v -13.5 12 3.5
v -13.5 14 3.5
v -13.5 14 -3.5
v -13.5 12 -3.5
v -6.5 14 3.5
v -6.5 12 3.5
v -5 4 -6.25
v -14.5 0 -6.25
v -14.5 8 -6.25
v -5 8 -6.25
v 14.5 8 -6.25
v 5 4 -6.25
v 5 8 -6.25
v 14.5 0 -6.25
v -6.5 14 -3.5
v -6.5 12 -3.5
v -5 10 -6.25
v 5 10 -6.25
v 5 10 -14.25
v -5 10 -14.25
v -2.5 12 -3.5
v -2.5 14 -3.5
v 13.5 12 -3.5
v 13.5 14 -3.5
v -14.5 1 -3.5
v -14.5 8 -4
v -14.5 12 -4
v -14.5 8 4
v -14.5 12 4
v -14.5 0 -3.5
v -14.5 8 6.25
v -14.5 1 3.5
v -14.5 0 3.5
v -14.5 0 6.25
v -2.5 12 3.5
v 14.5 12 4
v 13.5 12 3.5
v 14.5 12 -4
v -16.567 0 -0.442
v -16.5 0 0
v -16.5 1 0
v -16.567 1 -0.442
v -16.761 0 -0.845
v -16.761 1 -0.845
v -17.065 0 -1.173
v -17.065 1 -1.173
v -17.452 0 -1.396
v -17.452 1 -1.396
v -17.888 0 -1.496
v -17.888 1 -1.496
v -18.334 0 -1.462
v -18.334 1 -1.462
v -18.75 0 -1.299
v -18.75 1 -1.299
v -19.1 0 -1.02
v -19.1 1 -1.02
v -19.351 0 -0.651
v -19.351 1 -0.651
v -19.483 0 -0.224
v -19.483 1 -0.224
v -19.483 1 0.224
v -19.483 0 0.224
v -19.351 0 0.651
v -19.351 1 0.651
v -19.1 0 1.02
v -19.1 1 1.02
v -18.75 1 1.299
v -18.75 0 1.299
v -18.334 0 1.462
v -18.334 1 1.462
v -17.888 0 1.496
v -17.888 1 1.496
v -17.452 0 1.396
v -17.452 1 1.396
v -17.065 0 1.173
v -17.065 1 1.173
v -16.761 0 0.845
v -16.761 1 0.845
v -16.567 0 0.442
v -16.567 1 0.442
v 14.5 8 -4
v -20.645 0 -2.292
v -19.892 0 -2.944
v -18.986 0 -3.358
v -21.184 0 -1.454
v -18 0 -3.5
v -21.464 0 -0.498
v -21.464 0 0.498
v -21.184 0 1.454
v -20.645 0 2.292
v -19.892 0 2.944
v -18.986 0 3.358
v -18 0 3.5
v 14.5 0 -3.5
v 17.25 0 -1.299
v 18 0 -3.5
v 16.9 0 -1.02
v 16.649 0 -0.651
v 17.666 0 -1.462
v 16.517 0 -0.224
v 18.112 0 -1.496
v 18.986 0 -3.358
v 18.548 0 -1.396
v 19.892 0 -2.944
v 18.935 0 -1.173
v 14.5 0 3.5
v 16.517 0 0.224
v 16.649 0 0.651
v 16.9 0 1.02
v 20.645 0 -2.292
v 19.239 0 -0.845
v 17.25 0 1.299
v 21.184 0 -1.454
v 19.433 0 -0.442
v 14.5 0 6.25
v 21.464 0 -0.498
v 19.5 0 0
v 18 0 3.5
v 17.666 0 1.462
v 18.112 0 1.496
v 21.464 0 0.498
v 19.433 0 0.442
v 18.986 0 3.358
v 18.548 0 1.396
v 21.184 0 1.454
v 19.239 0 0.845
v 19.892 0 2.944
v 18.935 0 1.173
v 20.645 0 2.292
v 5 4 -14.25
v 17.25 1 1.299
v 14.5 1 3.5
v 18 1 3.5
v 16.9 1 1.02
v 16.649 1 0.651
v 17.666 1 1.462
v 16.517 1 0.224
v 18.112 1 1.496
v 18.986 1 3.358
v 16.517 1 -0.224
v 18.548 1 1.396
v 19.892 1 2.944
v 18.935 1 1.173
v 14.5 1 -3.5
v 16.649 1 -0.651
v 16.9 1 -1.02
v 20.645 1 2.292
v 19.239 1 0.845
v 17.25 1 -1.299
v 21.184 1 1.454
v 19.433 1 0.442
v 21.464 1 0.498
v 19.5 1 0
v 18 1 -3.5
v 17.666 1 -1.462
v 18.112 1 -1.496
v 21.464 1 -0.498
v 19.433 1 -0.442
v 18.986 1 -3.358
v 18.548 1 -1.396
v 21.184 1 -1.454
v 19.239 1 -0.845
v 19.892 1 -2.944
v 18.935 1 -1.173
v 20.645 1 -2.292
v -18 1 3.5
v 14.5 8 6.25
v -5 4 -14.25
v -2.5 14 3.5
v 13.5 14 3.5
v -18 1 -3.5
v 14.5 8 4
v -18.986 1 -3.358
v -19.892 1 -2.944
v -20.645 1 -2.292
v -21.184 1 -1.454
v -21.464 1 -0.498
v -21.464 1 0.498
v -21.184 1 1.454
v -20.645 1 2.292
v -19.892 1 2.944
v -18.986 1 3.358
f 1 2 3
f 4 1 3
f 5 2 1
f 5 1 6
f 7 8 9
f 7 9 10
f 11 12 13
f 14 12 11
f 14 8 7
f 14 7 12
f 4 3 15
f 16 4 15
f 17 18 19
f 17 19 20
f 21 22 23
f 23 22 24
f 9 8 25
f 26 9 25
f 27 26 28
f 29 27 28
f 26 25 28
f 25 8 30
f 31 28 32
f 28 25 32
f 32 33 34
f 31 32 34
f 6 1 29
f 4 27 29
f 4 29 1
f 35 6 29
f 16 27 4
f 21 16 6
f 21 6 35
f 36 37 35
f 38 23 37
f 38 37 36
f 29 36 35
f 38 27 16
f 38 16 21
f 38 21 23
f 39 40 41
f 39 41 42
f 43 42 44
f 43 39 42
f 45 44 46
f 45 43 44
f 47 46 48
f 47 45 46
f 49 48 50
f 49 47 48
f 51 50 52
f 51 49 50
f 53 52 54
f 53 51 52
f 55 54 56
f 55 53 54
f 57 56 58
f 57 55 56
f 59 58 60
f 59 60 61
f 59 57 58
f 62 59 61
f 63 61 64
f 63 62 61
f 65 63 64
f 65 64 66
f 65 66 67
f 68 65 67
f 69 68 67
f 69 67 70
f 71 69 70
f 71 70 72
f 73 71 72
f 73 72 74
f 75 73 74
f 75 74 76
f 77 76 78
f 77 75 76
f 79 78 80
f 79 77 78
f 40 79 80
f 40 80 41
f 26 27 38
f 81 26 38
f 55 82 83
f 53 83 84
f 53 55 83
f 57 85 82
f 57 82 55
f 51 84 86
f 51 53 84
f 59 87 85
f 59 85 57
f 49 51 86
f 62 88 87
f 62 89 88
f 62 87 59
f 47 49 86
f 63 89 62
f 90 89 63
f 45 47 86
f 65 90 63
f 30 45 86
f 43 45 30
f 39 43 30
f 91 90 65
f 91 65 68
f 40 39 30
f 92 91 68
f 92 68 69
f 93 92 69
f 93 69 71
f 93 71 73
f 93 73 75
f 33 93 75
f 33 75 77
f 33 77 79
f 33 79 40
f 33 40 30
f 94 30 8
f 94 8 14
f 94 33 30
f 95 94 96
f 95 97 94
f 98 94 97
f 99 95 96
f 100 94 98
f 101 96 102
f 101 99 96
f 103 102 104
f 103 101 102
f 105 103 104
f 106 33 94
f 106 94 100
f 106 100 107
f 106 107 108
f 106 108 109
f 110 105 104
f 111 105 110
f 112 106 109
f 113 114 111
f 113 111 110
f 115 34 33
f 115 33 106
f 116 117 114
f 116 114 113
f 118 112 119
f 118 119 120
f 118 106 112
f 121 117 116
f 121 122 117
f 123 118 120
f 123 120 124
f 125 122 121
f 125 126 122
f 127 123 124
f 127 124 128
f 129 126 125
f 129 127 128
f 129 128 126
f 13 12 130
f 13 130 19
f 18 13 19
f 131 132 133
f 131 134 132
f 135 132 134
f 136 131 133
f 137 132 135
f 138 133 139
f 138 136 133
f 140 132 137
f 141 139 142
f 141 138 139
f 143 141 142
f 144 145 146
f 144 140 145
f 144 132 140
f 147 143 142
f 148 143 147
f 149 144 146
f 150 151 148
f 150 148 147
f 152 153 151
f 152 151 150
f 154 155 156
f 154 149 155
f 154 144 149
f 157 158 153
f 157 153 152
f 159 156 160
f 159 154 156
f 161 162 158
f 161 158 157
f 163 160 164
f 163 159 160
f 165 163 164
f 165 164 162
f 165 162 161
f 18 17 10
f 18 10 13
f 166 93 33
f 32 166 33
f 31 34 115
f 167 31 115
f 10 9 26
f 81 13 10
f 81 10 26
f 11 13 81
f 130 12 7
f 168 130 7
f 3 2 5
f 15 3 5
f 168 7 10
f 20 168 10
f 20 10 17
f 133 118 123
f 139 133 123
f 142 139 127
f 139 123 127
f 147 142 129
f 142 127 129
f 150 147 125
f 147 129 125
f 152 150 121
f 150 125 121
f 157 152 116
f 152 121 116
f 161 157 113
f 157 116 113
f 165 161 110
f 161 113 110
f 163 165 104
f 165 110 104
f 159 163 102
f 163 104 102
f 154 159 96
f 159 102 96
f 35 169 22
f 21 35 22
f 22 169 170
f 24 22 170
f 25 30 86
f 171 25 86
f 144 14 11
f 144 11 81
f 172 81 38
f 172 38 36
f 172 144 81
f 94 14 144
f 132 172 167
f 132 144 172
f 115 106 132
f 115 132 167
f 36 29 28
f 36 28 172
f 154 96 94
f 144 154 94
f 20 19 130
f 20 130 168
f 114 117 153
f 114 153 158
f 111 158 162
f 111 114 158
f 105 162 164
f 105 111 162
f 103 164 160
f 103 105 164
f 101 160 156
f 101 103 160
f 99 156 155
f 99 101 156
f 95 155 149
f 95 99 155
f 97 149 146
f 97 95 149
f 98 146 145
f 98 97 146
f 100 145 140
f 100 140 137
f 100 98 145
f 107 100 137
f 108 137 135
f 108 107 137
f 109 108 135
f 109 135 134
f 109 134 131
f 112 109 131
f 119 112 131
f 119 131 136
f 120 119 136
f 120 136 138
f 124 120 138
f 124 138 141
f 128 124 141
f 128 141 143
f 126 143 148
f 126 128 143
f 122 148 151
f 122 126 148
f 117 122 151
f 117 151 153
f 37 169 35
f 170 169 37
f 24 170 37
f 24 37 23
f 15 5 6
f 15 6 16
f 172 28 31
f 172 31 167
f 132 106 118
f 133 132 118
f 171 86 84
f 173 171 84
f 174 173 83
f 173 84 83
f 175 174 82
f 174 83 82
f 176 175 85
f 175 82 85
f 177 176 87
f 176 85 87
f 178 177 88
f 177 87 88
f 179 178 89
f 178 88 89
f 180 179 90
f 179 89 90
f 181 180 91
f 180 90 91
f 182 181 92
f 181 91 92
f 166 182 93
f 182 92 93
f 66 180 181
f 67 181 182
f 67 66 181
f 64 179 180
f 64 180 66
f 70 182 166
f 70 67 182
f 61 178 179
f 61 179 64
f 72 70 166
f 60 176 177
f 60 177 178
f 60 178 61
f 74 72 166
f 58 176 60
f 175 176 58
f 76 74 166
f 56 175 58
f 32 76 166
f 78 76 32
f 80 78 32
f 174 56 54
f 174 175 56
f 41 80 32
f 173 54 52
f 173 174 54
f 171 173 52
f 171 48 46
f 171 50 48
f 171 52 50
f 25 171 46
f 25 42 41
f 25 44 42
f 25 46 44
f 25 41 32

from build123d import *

# Parameters (mm, degrees)
SKETCH_1_R          = 1.5
EXTRUDE_1_DEPTH     = 1
SKETCH_3_W          = 29
SKETCH_3_H          = 12.5
EXTRUDE_2_DEPTH     = 14
SKETCH_4_W          = 10
SKETCH_4_H          = 6
EXTRUDE_3_DEPTH     = 8
SKETCH_5_W          = 29
SKETCH_5_H          = 2.25
CUT_EXTRUDE_1_DEPTH = 6
SKETCH_6_W          = 29
SKETCH_6_H          = 12.5
SKETCH_6_W_2        = 27
SKETCH_6_H_2        = 7
CUT_EXTRUDE_2_DEPTH = 2
SKETCH_7_W          = 4
SKETCH_7_H          = 7
CUT_EXTRUDE_3_DEPTH = 2


with BuildPart() as part:
    # 草图1 → 凸台-拉伸1 (new body)
    with BuildSketch(Plane(origin=(0, 0, 0), x_dir=(1, 0, 0), z_dir=(0, 1, 0))):
        with BuildLine():
            Line((-18, -3.5), (18, -3.5))
            ThreePointArc((18, -3.5), (21.5, 0), (18, 3.5))
            Line((18, 3.5), (-18, 3.5))
            ThreePointArc((-18, 3.5), (-21.5, 0), (-18, -3.5))
        make_face()
        with Locations((-18, 0)):
            Circle(SKETCH_1_R, mode=Mode.SUBTRACT)
        with Locations((18, 0)):
            Circle(SKETCH_1_R, mode=Mode.SUBTRACT)
    extrude(amount=EXTRUDE_1_DEPTH)

    # 草图3 → 凸台-拉伸2 (add)
    with BuildSketch(Plane.XZ):
        Rectangle(SKETCH_3_W, SKETCH_3_H)
    extrude(amount=-EXTRUDE_2_DEPTH)

    # 草图4 → 凸台-拉伸3 (add)
    with BuildSketch(Plane(origin=(0, 0, -6.25), x_dir=(-1, 0, 0), z_dir=(0, 0, -1))):
        with Locations((0, 7)):
            Rectangle(SKETCH_4_W, SKETCH_4_H)
    extrude(amount=EXTRUDE_3_DEPTH)

    # 草图5 → 切除-拉伸1 (cut)
    with BuildSketch(Plane(origin=(0, 14, 0), x_dir=(1, 0, 0), z_dir=(0, 1, 0))):
        with Locations((0, 5.125)):
            Rectangle(SKETCH_5_W, SKETCH_5_H)
        with Locations((0, -5.125)):
            Rectangle(SKETCH_5_W, SKETCH_5_H)
    extrude(amount=-CUT_EXTRUDE_1_DEPTH, mode=Mode.SUBTRACT)

    # 草图6 → 切除-拉伸2 (cut)
    with BuildSketch(Plane(origin=(0, 14, 0), x_dir=(1, 0, 0), z_dir=(0, 1, 0))):
        Rectangle(SKETCH_6_W, SKETCH_6_H)
        Rectangle(SKETCH_6_W_2, SKETCH_6_H_2, mode=Mode.SUBTRACT)
    extrude(amount=-CUT_EXTRUDE_2_DEPTH, mode=Mode.SUBTRACT)

    # 草图7 → 切除-拉伸3 (cut)
    with BuildSketch(Plane(origin=(0, 14, 0), x_dir=(1, 0, 0), z_dir=(0, 1, 0))):
        with Locations((-4.5, 0)):
            Rectangle(SKETCH_7_W, SKETCH_7_H)
    extrude(amount=-CUT_EXTRUDE_3_DEPTH, mode=Mode.SUBTRACT)


solid = part.part
